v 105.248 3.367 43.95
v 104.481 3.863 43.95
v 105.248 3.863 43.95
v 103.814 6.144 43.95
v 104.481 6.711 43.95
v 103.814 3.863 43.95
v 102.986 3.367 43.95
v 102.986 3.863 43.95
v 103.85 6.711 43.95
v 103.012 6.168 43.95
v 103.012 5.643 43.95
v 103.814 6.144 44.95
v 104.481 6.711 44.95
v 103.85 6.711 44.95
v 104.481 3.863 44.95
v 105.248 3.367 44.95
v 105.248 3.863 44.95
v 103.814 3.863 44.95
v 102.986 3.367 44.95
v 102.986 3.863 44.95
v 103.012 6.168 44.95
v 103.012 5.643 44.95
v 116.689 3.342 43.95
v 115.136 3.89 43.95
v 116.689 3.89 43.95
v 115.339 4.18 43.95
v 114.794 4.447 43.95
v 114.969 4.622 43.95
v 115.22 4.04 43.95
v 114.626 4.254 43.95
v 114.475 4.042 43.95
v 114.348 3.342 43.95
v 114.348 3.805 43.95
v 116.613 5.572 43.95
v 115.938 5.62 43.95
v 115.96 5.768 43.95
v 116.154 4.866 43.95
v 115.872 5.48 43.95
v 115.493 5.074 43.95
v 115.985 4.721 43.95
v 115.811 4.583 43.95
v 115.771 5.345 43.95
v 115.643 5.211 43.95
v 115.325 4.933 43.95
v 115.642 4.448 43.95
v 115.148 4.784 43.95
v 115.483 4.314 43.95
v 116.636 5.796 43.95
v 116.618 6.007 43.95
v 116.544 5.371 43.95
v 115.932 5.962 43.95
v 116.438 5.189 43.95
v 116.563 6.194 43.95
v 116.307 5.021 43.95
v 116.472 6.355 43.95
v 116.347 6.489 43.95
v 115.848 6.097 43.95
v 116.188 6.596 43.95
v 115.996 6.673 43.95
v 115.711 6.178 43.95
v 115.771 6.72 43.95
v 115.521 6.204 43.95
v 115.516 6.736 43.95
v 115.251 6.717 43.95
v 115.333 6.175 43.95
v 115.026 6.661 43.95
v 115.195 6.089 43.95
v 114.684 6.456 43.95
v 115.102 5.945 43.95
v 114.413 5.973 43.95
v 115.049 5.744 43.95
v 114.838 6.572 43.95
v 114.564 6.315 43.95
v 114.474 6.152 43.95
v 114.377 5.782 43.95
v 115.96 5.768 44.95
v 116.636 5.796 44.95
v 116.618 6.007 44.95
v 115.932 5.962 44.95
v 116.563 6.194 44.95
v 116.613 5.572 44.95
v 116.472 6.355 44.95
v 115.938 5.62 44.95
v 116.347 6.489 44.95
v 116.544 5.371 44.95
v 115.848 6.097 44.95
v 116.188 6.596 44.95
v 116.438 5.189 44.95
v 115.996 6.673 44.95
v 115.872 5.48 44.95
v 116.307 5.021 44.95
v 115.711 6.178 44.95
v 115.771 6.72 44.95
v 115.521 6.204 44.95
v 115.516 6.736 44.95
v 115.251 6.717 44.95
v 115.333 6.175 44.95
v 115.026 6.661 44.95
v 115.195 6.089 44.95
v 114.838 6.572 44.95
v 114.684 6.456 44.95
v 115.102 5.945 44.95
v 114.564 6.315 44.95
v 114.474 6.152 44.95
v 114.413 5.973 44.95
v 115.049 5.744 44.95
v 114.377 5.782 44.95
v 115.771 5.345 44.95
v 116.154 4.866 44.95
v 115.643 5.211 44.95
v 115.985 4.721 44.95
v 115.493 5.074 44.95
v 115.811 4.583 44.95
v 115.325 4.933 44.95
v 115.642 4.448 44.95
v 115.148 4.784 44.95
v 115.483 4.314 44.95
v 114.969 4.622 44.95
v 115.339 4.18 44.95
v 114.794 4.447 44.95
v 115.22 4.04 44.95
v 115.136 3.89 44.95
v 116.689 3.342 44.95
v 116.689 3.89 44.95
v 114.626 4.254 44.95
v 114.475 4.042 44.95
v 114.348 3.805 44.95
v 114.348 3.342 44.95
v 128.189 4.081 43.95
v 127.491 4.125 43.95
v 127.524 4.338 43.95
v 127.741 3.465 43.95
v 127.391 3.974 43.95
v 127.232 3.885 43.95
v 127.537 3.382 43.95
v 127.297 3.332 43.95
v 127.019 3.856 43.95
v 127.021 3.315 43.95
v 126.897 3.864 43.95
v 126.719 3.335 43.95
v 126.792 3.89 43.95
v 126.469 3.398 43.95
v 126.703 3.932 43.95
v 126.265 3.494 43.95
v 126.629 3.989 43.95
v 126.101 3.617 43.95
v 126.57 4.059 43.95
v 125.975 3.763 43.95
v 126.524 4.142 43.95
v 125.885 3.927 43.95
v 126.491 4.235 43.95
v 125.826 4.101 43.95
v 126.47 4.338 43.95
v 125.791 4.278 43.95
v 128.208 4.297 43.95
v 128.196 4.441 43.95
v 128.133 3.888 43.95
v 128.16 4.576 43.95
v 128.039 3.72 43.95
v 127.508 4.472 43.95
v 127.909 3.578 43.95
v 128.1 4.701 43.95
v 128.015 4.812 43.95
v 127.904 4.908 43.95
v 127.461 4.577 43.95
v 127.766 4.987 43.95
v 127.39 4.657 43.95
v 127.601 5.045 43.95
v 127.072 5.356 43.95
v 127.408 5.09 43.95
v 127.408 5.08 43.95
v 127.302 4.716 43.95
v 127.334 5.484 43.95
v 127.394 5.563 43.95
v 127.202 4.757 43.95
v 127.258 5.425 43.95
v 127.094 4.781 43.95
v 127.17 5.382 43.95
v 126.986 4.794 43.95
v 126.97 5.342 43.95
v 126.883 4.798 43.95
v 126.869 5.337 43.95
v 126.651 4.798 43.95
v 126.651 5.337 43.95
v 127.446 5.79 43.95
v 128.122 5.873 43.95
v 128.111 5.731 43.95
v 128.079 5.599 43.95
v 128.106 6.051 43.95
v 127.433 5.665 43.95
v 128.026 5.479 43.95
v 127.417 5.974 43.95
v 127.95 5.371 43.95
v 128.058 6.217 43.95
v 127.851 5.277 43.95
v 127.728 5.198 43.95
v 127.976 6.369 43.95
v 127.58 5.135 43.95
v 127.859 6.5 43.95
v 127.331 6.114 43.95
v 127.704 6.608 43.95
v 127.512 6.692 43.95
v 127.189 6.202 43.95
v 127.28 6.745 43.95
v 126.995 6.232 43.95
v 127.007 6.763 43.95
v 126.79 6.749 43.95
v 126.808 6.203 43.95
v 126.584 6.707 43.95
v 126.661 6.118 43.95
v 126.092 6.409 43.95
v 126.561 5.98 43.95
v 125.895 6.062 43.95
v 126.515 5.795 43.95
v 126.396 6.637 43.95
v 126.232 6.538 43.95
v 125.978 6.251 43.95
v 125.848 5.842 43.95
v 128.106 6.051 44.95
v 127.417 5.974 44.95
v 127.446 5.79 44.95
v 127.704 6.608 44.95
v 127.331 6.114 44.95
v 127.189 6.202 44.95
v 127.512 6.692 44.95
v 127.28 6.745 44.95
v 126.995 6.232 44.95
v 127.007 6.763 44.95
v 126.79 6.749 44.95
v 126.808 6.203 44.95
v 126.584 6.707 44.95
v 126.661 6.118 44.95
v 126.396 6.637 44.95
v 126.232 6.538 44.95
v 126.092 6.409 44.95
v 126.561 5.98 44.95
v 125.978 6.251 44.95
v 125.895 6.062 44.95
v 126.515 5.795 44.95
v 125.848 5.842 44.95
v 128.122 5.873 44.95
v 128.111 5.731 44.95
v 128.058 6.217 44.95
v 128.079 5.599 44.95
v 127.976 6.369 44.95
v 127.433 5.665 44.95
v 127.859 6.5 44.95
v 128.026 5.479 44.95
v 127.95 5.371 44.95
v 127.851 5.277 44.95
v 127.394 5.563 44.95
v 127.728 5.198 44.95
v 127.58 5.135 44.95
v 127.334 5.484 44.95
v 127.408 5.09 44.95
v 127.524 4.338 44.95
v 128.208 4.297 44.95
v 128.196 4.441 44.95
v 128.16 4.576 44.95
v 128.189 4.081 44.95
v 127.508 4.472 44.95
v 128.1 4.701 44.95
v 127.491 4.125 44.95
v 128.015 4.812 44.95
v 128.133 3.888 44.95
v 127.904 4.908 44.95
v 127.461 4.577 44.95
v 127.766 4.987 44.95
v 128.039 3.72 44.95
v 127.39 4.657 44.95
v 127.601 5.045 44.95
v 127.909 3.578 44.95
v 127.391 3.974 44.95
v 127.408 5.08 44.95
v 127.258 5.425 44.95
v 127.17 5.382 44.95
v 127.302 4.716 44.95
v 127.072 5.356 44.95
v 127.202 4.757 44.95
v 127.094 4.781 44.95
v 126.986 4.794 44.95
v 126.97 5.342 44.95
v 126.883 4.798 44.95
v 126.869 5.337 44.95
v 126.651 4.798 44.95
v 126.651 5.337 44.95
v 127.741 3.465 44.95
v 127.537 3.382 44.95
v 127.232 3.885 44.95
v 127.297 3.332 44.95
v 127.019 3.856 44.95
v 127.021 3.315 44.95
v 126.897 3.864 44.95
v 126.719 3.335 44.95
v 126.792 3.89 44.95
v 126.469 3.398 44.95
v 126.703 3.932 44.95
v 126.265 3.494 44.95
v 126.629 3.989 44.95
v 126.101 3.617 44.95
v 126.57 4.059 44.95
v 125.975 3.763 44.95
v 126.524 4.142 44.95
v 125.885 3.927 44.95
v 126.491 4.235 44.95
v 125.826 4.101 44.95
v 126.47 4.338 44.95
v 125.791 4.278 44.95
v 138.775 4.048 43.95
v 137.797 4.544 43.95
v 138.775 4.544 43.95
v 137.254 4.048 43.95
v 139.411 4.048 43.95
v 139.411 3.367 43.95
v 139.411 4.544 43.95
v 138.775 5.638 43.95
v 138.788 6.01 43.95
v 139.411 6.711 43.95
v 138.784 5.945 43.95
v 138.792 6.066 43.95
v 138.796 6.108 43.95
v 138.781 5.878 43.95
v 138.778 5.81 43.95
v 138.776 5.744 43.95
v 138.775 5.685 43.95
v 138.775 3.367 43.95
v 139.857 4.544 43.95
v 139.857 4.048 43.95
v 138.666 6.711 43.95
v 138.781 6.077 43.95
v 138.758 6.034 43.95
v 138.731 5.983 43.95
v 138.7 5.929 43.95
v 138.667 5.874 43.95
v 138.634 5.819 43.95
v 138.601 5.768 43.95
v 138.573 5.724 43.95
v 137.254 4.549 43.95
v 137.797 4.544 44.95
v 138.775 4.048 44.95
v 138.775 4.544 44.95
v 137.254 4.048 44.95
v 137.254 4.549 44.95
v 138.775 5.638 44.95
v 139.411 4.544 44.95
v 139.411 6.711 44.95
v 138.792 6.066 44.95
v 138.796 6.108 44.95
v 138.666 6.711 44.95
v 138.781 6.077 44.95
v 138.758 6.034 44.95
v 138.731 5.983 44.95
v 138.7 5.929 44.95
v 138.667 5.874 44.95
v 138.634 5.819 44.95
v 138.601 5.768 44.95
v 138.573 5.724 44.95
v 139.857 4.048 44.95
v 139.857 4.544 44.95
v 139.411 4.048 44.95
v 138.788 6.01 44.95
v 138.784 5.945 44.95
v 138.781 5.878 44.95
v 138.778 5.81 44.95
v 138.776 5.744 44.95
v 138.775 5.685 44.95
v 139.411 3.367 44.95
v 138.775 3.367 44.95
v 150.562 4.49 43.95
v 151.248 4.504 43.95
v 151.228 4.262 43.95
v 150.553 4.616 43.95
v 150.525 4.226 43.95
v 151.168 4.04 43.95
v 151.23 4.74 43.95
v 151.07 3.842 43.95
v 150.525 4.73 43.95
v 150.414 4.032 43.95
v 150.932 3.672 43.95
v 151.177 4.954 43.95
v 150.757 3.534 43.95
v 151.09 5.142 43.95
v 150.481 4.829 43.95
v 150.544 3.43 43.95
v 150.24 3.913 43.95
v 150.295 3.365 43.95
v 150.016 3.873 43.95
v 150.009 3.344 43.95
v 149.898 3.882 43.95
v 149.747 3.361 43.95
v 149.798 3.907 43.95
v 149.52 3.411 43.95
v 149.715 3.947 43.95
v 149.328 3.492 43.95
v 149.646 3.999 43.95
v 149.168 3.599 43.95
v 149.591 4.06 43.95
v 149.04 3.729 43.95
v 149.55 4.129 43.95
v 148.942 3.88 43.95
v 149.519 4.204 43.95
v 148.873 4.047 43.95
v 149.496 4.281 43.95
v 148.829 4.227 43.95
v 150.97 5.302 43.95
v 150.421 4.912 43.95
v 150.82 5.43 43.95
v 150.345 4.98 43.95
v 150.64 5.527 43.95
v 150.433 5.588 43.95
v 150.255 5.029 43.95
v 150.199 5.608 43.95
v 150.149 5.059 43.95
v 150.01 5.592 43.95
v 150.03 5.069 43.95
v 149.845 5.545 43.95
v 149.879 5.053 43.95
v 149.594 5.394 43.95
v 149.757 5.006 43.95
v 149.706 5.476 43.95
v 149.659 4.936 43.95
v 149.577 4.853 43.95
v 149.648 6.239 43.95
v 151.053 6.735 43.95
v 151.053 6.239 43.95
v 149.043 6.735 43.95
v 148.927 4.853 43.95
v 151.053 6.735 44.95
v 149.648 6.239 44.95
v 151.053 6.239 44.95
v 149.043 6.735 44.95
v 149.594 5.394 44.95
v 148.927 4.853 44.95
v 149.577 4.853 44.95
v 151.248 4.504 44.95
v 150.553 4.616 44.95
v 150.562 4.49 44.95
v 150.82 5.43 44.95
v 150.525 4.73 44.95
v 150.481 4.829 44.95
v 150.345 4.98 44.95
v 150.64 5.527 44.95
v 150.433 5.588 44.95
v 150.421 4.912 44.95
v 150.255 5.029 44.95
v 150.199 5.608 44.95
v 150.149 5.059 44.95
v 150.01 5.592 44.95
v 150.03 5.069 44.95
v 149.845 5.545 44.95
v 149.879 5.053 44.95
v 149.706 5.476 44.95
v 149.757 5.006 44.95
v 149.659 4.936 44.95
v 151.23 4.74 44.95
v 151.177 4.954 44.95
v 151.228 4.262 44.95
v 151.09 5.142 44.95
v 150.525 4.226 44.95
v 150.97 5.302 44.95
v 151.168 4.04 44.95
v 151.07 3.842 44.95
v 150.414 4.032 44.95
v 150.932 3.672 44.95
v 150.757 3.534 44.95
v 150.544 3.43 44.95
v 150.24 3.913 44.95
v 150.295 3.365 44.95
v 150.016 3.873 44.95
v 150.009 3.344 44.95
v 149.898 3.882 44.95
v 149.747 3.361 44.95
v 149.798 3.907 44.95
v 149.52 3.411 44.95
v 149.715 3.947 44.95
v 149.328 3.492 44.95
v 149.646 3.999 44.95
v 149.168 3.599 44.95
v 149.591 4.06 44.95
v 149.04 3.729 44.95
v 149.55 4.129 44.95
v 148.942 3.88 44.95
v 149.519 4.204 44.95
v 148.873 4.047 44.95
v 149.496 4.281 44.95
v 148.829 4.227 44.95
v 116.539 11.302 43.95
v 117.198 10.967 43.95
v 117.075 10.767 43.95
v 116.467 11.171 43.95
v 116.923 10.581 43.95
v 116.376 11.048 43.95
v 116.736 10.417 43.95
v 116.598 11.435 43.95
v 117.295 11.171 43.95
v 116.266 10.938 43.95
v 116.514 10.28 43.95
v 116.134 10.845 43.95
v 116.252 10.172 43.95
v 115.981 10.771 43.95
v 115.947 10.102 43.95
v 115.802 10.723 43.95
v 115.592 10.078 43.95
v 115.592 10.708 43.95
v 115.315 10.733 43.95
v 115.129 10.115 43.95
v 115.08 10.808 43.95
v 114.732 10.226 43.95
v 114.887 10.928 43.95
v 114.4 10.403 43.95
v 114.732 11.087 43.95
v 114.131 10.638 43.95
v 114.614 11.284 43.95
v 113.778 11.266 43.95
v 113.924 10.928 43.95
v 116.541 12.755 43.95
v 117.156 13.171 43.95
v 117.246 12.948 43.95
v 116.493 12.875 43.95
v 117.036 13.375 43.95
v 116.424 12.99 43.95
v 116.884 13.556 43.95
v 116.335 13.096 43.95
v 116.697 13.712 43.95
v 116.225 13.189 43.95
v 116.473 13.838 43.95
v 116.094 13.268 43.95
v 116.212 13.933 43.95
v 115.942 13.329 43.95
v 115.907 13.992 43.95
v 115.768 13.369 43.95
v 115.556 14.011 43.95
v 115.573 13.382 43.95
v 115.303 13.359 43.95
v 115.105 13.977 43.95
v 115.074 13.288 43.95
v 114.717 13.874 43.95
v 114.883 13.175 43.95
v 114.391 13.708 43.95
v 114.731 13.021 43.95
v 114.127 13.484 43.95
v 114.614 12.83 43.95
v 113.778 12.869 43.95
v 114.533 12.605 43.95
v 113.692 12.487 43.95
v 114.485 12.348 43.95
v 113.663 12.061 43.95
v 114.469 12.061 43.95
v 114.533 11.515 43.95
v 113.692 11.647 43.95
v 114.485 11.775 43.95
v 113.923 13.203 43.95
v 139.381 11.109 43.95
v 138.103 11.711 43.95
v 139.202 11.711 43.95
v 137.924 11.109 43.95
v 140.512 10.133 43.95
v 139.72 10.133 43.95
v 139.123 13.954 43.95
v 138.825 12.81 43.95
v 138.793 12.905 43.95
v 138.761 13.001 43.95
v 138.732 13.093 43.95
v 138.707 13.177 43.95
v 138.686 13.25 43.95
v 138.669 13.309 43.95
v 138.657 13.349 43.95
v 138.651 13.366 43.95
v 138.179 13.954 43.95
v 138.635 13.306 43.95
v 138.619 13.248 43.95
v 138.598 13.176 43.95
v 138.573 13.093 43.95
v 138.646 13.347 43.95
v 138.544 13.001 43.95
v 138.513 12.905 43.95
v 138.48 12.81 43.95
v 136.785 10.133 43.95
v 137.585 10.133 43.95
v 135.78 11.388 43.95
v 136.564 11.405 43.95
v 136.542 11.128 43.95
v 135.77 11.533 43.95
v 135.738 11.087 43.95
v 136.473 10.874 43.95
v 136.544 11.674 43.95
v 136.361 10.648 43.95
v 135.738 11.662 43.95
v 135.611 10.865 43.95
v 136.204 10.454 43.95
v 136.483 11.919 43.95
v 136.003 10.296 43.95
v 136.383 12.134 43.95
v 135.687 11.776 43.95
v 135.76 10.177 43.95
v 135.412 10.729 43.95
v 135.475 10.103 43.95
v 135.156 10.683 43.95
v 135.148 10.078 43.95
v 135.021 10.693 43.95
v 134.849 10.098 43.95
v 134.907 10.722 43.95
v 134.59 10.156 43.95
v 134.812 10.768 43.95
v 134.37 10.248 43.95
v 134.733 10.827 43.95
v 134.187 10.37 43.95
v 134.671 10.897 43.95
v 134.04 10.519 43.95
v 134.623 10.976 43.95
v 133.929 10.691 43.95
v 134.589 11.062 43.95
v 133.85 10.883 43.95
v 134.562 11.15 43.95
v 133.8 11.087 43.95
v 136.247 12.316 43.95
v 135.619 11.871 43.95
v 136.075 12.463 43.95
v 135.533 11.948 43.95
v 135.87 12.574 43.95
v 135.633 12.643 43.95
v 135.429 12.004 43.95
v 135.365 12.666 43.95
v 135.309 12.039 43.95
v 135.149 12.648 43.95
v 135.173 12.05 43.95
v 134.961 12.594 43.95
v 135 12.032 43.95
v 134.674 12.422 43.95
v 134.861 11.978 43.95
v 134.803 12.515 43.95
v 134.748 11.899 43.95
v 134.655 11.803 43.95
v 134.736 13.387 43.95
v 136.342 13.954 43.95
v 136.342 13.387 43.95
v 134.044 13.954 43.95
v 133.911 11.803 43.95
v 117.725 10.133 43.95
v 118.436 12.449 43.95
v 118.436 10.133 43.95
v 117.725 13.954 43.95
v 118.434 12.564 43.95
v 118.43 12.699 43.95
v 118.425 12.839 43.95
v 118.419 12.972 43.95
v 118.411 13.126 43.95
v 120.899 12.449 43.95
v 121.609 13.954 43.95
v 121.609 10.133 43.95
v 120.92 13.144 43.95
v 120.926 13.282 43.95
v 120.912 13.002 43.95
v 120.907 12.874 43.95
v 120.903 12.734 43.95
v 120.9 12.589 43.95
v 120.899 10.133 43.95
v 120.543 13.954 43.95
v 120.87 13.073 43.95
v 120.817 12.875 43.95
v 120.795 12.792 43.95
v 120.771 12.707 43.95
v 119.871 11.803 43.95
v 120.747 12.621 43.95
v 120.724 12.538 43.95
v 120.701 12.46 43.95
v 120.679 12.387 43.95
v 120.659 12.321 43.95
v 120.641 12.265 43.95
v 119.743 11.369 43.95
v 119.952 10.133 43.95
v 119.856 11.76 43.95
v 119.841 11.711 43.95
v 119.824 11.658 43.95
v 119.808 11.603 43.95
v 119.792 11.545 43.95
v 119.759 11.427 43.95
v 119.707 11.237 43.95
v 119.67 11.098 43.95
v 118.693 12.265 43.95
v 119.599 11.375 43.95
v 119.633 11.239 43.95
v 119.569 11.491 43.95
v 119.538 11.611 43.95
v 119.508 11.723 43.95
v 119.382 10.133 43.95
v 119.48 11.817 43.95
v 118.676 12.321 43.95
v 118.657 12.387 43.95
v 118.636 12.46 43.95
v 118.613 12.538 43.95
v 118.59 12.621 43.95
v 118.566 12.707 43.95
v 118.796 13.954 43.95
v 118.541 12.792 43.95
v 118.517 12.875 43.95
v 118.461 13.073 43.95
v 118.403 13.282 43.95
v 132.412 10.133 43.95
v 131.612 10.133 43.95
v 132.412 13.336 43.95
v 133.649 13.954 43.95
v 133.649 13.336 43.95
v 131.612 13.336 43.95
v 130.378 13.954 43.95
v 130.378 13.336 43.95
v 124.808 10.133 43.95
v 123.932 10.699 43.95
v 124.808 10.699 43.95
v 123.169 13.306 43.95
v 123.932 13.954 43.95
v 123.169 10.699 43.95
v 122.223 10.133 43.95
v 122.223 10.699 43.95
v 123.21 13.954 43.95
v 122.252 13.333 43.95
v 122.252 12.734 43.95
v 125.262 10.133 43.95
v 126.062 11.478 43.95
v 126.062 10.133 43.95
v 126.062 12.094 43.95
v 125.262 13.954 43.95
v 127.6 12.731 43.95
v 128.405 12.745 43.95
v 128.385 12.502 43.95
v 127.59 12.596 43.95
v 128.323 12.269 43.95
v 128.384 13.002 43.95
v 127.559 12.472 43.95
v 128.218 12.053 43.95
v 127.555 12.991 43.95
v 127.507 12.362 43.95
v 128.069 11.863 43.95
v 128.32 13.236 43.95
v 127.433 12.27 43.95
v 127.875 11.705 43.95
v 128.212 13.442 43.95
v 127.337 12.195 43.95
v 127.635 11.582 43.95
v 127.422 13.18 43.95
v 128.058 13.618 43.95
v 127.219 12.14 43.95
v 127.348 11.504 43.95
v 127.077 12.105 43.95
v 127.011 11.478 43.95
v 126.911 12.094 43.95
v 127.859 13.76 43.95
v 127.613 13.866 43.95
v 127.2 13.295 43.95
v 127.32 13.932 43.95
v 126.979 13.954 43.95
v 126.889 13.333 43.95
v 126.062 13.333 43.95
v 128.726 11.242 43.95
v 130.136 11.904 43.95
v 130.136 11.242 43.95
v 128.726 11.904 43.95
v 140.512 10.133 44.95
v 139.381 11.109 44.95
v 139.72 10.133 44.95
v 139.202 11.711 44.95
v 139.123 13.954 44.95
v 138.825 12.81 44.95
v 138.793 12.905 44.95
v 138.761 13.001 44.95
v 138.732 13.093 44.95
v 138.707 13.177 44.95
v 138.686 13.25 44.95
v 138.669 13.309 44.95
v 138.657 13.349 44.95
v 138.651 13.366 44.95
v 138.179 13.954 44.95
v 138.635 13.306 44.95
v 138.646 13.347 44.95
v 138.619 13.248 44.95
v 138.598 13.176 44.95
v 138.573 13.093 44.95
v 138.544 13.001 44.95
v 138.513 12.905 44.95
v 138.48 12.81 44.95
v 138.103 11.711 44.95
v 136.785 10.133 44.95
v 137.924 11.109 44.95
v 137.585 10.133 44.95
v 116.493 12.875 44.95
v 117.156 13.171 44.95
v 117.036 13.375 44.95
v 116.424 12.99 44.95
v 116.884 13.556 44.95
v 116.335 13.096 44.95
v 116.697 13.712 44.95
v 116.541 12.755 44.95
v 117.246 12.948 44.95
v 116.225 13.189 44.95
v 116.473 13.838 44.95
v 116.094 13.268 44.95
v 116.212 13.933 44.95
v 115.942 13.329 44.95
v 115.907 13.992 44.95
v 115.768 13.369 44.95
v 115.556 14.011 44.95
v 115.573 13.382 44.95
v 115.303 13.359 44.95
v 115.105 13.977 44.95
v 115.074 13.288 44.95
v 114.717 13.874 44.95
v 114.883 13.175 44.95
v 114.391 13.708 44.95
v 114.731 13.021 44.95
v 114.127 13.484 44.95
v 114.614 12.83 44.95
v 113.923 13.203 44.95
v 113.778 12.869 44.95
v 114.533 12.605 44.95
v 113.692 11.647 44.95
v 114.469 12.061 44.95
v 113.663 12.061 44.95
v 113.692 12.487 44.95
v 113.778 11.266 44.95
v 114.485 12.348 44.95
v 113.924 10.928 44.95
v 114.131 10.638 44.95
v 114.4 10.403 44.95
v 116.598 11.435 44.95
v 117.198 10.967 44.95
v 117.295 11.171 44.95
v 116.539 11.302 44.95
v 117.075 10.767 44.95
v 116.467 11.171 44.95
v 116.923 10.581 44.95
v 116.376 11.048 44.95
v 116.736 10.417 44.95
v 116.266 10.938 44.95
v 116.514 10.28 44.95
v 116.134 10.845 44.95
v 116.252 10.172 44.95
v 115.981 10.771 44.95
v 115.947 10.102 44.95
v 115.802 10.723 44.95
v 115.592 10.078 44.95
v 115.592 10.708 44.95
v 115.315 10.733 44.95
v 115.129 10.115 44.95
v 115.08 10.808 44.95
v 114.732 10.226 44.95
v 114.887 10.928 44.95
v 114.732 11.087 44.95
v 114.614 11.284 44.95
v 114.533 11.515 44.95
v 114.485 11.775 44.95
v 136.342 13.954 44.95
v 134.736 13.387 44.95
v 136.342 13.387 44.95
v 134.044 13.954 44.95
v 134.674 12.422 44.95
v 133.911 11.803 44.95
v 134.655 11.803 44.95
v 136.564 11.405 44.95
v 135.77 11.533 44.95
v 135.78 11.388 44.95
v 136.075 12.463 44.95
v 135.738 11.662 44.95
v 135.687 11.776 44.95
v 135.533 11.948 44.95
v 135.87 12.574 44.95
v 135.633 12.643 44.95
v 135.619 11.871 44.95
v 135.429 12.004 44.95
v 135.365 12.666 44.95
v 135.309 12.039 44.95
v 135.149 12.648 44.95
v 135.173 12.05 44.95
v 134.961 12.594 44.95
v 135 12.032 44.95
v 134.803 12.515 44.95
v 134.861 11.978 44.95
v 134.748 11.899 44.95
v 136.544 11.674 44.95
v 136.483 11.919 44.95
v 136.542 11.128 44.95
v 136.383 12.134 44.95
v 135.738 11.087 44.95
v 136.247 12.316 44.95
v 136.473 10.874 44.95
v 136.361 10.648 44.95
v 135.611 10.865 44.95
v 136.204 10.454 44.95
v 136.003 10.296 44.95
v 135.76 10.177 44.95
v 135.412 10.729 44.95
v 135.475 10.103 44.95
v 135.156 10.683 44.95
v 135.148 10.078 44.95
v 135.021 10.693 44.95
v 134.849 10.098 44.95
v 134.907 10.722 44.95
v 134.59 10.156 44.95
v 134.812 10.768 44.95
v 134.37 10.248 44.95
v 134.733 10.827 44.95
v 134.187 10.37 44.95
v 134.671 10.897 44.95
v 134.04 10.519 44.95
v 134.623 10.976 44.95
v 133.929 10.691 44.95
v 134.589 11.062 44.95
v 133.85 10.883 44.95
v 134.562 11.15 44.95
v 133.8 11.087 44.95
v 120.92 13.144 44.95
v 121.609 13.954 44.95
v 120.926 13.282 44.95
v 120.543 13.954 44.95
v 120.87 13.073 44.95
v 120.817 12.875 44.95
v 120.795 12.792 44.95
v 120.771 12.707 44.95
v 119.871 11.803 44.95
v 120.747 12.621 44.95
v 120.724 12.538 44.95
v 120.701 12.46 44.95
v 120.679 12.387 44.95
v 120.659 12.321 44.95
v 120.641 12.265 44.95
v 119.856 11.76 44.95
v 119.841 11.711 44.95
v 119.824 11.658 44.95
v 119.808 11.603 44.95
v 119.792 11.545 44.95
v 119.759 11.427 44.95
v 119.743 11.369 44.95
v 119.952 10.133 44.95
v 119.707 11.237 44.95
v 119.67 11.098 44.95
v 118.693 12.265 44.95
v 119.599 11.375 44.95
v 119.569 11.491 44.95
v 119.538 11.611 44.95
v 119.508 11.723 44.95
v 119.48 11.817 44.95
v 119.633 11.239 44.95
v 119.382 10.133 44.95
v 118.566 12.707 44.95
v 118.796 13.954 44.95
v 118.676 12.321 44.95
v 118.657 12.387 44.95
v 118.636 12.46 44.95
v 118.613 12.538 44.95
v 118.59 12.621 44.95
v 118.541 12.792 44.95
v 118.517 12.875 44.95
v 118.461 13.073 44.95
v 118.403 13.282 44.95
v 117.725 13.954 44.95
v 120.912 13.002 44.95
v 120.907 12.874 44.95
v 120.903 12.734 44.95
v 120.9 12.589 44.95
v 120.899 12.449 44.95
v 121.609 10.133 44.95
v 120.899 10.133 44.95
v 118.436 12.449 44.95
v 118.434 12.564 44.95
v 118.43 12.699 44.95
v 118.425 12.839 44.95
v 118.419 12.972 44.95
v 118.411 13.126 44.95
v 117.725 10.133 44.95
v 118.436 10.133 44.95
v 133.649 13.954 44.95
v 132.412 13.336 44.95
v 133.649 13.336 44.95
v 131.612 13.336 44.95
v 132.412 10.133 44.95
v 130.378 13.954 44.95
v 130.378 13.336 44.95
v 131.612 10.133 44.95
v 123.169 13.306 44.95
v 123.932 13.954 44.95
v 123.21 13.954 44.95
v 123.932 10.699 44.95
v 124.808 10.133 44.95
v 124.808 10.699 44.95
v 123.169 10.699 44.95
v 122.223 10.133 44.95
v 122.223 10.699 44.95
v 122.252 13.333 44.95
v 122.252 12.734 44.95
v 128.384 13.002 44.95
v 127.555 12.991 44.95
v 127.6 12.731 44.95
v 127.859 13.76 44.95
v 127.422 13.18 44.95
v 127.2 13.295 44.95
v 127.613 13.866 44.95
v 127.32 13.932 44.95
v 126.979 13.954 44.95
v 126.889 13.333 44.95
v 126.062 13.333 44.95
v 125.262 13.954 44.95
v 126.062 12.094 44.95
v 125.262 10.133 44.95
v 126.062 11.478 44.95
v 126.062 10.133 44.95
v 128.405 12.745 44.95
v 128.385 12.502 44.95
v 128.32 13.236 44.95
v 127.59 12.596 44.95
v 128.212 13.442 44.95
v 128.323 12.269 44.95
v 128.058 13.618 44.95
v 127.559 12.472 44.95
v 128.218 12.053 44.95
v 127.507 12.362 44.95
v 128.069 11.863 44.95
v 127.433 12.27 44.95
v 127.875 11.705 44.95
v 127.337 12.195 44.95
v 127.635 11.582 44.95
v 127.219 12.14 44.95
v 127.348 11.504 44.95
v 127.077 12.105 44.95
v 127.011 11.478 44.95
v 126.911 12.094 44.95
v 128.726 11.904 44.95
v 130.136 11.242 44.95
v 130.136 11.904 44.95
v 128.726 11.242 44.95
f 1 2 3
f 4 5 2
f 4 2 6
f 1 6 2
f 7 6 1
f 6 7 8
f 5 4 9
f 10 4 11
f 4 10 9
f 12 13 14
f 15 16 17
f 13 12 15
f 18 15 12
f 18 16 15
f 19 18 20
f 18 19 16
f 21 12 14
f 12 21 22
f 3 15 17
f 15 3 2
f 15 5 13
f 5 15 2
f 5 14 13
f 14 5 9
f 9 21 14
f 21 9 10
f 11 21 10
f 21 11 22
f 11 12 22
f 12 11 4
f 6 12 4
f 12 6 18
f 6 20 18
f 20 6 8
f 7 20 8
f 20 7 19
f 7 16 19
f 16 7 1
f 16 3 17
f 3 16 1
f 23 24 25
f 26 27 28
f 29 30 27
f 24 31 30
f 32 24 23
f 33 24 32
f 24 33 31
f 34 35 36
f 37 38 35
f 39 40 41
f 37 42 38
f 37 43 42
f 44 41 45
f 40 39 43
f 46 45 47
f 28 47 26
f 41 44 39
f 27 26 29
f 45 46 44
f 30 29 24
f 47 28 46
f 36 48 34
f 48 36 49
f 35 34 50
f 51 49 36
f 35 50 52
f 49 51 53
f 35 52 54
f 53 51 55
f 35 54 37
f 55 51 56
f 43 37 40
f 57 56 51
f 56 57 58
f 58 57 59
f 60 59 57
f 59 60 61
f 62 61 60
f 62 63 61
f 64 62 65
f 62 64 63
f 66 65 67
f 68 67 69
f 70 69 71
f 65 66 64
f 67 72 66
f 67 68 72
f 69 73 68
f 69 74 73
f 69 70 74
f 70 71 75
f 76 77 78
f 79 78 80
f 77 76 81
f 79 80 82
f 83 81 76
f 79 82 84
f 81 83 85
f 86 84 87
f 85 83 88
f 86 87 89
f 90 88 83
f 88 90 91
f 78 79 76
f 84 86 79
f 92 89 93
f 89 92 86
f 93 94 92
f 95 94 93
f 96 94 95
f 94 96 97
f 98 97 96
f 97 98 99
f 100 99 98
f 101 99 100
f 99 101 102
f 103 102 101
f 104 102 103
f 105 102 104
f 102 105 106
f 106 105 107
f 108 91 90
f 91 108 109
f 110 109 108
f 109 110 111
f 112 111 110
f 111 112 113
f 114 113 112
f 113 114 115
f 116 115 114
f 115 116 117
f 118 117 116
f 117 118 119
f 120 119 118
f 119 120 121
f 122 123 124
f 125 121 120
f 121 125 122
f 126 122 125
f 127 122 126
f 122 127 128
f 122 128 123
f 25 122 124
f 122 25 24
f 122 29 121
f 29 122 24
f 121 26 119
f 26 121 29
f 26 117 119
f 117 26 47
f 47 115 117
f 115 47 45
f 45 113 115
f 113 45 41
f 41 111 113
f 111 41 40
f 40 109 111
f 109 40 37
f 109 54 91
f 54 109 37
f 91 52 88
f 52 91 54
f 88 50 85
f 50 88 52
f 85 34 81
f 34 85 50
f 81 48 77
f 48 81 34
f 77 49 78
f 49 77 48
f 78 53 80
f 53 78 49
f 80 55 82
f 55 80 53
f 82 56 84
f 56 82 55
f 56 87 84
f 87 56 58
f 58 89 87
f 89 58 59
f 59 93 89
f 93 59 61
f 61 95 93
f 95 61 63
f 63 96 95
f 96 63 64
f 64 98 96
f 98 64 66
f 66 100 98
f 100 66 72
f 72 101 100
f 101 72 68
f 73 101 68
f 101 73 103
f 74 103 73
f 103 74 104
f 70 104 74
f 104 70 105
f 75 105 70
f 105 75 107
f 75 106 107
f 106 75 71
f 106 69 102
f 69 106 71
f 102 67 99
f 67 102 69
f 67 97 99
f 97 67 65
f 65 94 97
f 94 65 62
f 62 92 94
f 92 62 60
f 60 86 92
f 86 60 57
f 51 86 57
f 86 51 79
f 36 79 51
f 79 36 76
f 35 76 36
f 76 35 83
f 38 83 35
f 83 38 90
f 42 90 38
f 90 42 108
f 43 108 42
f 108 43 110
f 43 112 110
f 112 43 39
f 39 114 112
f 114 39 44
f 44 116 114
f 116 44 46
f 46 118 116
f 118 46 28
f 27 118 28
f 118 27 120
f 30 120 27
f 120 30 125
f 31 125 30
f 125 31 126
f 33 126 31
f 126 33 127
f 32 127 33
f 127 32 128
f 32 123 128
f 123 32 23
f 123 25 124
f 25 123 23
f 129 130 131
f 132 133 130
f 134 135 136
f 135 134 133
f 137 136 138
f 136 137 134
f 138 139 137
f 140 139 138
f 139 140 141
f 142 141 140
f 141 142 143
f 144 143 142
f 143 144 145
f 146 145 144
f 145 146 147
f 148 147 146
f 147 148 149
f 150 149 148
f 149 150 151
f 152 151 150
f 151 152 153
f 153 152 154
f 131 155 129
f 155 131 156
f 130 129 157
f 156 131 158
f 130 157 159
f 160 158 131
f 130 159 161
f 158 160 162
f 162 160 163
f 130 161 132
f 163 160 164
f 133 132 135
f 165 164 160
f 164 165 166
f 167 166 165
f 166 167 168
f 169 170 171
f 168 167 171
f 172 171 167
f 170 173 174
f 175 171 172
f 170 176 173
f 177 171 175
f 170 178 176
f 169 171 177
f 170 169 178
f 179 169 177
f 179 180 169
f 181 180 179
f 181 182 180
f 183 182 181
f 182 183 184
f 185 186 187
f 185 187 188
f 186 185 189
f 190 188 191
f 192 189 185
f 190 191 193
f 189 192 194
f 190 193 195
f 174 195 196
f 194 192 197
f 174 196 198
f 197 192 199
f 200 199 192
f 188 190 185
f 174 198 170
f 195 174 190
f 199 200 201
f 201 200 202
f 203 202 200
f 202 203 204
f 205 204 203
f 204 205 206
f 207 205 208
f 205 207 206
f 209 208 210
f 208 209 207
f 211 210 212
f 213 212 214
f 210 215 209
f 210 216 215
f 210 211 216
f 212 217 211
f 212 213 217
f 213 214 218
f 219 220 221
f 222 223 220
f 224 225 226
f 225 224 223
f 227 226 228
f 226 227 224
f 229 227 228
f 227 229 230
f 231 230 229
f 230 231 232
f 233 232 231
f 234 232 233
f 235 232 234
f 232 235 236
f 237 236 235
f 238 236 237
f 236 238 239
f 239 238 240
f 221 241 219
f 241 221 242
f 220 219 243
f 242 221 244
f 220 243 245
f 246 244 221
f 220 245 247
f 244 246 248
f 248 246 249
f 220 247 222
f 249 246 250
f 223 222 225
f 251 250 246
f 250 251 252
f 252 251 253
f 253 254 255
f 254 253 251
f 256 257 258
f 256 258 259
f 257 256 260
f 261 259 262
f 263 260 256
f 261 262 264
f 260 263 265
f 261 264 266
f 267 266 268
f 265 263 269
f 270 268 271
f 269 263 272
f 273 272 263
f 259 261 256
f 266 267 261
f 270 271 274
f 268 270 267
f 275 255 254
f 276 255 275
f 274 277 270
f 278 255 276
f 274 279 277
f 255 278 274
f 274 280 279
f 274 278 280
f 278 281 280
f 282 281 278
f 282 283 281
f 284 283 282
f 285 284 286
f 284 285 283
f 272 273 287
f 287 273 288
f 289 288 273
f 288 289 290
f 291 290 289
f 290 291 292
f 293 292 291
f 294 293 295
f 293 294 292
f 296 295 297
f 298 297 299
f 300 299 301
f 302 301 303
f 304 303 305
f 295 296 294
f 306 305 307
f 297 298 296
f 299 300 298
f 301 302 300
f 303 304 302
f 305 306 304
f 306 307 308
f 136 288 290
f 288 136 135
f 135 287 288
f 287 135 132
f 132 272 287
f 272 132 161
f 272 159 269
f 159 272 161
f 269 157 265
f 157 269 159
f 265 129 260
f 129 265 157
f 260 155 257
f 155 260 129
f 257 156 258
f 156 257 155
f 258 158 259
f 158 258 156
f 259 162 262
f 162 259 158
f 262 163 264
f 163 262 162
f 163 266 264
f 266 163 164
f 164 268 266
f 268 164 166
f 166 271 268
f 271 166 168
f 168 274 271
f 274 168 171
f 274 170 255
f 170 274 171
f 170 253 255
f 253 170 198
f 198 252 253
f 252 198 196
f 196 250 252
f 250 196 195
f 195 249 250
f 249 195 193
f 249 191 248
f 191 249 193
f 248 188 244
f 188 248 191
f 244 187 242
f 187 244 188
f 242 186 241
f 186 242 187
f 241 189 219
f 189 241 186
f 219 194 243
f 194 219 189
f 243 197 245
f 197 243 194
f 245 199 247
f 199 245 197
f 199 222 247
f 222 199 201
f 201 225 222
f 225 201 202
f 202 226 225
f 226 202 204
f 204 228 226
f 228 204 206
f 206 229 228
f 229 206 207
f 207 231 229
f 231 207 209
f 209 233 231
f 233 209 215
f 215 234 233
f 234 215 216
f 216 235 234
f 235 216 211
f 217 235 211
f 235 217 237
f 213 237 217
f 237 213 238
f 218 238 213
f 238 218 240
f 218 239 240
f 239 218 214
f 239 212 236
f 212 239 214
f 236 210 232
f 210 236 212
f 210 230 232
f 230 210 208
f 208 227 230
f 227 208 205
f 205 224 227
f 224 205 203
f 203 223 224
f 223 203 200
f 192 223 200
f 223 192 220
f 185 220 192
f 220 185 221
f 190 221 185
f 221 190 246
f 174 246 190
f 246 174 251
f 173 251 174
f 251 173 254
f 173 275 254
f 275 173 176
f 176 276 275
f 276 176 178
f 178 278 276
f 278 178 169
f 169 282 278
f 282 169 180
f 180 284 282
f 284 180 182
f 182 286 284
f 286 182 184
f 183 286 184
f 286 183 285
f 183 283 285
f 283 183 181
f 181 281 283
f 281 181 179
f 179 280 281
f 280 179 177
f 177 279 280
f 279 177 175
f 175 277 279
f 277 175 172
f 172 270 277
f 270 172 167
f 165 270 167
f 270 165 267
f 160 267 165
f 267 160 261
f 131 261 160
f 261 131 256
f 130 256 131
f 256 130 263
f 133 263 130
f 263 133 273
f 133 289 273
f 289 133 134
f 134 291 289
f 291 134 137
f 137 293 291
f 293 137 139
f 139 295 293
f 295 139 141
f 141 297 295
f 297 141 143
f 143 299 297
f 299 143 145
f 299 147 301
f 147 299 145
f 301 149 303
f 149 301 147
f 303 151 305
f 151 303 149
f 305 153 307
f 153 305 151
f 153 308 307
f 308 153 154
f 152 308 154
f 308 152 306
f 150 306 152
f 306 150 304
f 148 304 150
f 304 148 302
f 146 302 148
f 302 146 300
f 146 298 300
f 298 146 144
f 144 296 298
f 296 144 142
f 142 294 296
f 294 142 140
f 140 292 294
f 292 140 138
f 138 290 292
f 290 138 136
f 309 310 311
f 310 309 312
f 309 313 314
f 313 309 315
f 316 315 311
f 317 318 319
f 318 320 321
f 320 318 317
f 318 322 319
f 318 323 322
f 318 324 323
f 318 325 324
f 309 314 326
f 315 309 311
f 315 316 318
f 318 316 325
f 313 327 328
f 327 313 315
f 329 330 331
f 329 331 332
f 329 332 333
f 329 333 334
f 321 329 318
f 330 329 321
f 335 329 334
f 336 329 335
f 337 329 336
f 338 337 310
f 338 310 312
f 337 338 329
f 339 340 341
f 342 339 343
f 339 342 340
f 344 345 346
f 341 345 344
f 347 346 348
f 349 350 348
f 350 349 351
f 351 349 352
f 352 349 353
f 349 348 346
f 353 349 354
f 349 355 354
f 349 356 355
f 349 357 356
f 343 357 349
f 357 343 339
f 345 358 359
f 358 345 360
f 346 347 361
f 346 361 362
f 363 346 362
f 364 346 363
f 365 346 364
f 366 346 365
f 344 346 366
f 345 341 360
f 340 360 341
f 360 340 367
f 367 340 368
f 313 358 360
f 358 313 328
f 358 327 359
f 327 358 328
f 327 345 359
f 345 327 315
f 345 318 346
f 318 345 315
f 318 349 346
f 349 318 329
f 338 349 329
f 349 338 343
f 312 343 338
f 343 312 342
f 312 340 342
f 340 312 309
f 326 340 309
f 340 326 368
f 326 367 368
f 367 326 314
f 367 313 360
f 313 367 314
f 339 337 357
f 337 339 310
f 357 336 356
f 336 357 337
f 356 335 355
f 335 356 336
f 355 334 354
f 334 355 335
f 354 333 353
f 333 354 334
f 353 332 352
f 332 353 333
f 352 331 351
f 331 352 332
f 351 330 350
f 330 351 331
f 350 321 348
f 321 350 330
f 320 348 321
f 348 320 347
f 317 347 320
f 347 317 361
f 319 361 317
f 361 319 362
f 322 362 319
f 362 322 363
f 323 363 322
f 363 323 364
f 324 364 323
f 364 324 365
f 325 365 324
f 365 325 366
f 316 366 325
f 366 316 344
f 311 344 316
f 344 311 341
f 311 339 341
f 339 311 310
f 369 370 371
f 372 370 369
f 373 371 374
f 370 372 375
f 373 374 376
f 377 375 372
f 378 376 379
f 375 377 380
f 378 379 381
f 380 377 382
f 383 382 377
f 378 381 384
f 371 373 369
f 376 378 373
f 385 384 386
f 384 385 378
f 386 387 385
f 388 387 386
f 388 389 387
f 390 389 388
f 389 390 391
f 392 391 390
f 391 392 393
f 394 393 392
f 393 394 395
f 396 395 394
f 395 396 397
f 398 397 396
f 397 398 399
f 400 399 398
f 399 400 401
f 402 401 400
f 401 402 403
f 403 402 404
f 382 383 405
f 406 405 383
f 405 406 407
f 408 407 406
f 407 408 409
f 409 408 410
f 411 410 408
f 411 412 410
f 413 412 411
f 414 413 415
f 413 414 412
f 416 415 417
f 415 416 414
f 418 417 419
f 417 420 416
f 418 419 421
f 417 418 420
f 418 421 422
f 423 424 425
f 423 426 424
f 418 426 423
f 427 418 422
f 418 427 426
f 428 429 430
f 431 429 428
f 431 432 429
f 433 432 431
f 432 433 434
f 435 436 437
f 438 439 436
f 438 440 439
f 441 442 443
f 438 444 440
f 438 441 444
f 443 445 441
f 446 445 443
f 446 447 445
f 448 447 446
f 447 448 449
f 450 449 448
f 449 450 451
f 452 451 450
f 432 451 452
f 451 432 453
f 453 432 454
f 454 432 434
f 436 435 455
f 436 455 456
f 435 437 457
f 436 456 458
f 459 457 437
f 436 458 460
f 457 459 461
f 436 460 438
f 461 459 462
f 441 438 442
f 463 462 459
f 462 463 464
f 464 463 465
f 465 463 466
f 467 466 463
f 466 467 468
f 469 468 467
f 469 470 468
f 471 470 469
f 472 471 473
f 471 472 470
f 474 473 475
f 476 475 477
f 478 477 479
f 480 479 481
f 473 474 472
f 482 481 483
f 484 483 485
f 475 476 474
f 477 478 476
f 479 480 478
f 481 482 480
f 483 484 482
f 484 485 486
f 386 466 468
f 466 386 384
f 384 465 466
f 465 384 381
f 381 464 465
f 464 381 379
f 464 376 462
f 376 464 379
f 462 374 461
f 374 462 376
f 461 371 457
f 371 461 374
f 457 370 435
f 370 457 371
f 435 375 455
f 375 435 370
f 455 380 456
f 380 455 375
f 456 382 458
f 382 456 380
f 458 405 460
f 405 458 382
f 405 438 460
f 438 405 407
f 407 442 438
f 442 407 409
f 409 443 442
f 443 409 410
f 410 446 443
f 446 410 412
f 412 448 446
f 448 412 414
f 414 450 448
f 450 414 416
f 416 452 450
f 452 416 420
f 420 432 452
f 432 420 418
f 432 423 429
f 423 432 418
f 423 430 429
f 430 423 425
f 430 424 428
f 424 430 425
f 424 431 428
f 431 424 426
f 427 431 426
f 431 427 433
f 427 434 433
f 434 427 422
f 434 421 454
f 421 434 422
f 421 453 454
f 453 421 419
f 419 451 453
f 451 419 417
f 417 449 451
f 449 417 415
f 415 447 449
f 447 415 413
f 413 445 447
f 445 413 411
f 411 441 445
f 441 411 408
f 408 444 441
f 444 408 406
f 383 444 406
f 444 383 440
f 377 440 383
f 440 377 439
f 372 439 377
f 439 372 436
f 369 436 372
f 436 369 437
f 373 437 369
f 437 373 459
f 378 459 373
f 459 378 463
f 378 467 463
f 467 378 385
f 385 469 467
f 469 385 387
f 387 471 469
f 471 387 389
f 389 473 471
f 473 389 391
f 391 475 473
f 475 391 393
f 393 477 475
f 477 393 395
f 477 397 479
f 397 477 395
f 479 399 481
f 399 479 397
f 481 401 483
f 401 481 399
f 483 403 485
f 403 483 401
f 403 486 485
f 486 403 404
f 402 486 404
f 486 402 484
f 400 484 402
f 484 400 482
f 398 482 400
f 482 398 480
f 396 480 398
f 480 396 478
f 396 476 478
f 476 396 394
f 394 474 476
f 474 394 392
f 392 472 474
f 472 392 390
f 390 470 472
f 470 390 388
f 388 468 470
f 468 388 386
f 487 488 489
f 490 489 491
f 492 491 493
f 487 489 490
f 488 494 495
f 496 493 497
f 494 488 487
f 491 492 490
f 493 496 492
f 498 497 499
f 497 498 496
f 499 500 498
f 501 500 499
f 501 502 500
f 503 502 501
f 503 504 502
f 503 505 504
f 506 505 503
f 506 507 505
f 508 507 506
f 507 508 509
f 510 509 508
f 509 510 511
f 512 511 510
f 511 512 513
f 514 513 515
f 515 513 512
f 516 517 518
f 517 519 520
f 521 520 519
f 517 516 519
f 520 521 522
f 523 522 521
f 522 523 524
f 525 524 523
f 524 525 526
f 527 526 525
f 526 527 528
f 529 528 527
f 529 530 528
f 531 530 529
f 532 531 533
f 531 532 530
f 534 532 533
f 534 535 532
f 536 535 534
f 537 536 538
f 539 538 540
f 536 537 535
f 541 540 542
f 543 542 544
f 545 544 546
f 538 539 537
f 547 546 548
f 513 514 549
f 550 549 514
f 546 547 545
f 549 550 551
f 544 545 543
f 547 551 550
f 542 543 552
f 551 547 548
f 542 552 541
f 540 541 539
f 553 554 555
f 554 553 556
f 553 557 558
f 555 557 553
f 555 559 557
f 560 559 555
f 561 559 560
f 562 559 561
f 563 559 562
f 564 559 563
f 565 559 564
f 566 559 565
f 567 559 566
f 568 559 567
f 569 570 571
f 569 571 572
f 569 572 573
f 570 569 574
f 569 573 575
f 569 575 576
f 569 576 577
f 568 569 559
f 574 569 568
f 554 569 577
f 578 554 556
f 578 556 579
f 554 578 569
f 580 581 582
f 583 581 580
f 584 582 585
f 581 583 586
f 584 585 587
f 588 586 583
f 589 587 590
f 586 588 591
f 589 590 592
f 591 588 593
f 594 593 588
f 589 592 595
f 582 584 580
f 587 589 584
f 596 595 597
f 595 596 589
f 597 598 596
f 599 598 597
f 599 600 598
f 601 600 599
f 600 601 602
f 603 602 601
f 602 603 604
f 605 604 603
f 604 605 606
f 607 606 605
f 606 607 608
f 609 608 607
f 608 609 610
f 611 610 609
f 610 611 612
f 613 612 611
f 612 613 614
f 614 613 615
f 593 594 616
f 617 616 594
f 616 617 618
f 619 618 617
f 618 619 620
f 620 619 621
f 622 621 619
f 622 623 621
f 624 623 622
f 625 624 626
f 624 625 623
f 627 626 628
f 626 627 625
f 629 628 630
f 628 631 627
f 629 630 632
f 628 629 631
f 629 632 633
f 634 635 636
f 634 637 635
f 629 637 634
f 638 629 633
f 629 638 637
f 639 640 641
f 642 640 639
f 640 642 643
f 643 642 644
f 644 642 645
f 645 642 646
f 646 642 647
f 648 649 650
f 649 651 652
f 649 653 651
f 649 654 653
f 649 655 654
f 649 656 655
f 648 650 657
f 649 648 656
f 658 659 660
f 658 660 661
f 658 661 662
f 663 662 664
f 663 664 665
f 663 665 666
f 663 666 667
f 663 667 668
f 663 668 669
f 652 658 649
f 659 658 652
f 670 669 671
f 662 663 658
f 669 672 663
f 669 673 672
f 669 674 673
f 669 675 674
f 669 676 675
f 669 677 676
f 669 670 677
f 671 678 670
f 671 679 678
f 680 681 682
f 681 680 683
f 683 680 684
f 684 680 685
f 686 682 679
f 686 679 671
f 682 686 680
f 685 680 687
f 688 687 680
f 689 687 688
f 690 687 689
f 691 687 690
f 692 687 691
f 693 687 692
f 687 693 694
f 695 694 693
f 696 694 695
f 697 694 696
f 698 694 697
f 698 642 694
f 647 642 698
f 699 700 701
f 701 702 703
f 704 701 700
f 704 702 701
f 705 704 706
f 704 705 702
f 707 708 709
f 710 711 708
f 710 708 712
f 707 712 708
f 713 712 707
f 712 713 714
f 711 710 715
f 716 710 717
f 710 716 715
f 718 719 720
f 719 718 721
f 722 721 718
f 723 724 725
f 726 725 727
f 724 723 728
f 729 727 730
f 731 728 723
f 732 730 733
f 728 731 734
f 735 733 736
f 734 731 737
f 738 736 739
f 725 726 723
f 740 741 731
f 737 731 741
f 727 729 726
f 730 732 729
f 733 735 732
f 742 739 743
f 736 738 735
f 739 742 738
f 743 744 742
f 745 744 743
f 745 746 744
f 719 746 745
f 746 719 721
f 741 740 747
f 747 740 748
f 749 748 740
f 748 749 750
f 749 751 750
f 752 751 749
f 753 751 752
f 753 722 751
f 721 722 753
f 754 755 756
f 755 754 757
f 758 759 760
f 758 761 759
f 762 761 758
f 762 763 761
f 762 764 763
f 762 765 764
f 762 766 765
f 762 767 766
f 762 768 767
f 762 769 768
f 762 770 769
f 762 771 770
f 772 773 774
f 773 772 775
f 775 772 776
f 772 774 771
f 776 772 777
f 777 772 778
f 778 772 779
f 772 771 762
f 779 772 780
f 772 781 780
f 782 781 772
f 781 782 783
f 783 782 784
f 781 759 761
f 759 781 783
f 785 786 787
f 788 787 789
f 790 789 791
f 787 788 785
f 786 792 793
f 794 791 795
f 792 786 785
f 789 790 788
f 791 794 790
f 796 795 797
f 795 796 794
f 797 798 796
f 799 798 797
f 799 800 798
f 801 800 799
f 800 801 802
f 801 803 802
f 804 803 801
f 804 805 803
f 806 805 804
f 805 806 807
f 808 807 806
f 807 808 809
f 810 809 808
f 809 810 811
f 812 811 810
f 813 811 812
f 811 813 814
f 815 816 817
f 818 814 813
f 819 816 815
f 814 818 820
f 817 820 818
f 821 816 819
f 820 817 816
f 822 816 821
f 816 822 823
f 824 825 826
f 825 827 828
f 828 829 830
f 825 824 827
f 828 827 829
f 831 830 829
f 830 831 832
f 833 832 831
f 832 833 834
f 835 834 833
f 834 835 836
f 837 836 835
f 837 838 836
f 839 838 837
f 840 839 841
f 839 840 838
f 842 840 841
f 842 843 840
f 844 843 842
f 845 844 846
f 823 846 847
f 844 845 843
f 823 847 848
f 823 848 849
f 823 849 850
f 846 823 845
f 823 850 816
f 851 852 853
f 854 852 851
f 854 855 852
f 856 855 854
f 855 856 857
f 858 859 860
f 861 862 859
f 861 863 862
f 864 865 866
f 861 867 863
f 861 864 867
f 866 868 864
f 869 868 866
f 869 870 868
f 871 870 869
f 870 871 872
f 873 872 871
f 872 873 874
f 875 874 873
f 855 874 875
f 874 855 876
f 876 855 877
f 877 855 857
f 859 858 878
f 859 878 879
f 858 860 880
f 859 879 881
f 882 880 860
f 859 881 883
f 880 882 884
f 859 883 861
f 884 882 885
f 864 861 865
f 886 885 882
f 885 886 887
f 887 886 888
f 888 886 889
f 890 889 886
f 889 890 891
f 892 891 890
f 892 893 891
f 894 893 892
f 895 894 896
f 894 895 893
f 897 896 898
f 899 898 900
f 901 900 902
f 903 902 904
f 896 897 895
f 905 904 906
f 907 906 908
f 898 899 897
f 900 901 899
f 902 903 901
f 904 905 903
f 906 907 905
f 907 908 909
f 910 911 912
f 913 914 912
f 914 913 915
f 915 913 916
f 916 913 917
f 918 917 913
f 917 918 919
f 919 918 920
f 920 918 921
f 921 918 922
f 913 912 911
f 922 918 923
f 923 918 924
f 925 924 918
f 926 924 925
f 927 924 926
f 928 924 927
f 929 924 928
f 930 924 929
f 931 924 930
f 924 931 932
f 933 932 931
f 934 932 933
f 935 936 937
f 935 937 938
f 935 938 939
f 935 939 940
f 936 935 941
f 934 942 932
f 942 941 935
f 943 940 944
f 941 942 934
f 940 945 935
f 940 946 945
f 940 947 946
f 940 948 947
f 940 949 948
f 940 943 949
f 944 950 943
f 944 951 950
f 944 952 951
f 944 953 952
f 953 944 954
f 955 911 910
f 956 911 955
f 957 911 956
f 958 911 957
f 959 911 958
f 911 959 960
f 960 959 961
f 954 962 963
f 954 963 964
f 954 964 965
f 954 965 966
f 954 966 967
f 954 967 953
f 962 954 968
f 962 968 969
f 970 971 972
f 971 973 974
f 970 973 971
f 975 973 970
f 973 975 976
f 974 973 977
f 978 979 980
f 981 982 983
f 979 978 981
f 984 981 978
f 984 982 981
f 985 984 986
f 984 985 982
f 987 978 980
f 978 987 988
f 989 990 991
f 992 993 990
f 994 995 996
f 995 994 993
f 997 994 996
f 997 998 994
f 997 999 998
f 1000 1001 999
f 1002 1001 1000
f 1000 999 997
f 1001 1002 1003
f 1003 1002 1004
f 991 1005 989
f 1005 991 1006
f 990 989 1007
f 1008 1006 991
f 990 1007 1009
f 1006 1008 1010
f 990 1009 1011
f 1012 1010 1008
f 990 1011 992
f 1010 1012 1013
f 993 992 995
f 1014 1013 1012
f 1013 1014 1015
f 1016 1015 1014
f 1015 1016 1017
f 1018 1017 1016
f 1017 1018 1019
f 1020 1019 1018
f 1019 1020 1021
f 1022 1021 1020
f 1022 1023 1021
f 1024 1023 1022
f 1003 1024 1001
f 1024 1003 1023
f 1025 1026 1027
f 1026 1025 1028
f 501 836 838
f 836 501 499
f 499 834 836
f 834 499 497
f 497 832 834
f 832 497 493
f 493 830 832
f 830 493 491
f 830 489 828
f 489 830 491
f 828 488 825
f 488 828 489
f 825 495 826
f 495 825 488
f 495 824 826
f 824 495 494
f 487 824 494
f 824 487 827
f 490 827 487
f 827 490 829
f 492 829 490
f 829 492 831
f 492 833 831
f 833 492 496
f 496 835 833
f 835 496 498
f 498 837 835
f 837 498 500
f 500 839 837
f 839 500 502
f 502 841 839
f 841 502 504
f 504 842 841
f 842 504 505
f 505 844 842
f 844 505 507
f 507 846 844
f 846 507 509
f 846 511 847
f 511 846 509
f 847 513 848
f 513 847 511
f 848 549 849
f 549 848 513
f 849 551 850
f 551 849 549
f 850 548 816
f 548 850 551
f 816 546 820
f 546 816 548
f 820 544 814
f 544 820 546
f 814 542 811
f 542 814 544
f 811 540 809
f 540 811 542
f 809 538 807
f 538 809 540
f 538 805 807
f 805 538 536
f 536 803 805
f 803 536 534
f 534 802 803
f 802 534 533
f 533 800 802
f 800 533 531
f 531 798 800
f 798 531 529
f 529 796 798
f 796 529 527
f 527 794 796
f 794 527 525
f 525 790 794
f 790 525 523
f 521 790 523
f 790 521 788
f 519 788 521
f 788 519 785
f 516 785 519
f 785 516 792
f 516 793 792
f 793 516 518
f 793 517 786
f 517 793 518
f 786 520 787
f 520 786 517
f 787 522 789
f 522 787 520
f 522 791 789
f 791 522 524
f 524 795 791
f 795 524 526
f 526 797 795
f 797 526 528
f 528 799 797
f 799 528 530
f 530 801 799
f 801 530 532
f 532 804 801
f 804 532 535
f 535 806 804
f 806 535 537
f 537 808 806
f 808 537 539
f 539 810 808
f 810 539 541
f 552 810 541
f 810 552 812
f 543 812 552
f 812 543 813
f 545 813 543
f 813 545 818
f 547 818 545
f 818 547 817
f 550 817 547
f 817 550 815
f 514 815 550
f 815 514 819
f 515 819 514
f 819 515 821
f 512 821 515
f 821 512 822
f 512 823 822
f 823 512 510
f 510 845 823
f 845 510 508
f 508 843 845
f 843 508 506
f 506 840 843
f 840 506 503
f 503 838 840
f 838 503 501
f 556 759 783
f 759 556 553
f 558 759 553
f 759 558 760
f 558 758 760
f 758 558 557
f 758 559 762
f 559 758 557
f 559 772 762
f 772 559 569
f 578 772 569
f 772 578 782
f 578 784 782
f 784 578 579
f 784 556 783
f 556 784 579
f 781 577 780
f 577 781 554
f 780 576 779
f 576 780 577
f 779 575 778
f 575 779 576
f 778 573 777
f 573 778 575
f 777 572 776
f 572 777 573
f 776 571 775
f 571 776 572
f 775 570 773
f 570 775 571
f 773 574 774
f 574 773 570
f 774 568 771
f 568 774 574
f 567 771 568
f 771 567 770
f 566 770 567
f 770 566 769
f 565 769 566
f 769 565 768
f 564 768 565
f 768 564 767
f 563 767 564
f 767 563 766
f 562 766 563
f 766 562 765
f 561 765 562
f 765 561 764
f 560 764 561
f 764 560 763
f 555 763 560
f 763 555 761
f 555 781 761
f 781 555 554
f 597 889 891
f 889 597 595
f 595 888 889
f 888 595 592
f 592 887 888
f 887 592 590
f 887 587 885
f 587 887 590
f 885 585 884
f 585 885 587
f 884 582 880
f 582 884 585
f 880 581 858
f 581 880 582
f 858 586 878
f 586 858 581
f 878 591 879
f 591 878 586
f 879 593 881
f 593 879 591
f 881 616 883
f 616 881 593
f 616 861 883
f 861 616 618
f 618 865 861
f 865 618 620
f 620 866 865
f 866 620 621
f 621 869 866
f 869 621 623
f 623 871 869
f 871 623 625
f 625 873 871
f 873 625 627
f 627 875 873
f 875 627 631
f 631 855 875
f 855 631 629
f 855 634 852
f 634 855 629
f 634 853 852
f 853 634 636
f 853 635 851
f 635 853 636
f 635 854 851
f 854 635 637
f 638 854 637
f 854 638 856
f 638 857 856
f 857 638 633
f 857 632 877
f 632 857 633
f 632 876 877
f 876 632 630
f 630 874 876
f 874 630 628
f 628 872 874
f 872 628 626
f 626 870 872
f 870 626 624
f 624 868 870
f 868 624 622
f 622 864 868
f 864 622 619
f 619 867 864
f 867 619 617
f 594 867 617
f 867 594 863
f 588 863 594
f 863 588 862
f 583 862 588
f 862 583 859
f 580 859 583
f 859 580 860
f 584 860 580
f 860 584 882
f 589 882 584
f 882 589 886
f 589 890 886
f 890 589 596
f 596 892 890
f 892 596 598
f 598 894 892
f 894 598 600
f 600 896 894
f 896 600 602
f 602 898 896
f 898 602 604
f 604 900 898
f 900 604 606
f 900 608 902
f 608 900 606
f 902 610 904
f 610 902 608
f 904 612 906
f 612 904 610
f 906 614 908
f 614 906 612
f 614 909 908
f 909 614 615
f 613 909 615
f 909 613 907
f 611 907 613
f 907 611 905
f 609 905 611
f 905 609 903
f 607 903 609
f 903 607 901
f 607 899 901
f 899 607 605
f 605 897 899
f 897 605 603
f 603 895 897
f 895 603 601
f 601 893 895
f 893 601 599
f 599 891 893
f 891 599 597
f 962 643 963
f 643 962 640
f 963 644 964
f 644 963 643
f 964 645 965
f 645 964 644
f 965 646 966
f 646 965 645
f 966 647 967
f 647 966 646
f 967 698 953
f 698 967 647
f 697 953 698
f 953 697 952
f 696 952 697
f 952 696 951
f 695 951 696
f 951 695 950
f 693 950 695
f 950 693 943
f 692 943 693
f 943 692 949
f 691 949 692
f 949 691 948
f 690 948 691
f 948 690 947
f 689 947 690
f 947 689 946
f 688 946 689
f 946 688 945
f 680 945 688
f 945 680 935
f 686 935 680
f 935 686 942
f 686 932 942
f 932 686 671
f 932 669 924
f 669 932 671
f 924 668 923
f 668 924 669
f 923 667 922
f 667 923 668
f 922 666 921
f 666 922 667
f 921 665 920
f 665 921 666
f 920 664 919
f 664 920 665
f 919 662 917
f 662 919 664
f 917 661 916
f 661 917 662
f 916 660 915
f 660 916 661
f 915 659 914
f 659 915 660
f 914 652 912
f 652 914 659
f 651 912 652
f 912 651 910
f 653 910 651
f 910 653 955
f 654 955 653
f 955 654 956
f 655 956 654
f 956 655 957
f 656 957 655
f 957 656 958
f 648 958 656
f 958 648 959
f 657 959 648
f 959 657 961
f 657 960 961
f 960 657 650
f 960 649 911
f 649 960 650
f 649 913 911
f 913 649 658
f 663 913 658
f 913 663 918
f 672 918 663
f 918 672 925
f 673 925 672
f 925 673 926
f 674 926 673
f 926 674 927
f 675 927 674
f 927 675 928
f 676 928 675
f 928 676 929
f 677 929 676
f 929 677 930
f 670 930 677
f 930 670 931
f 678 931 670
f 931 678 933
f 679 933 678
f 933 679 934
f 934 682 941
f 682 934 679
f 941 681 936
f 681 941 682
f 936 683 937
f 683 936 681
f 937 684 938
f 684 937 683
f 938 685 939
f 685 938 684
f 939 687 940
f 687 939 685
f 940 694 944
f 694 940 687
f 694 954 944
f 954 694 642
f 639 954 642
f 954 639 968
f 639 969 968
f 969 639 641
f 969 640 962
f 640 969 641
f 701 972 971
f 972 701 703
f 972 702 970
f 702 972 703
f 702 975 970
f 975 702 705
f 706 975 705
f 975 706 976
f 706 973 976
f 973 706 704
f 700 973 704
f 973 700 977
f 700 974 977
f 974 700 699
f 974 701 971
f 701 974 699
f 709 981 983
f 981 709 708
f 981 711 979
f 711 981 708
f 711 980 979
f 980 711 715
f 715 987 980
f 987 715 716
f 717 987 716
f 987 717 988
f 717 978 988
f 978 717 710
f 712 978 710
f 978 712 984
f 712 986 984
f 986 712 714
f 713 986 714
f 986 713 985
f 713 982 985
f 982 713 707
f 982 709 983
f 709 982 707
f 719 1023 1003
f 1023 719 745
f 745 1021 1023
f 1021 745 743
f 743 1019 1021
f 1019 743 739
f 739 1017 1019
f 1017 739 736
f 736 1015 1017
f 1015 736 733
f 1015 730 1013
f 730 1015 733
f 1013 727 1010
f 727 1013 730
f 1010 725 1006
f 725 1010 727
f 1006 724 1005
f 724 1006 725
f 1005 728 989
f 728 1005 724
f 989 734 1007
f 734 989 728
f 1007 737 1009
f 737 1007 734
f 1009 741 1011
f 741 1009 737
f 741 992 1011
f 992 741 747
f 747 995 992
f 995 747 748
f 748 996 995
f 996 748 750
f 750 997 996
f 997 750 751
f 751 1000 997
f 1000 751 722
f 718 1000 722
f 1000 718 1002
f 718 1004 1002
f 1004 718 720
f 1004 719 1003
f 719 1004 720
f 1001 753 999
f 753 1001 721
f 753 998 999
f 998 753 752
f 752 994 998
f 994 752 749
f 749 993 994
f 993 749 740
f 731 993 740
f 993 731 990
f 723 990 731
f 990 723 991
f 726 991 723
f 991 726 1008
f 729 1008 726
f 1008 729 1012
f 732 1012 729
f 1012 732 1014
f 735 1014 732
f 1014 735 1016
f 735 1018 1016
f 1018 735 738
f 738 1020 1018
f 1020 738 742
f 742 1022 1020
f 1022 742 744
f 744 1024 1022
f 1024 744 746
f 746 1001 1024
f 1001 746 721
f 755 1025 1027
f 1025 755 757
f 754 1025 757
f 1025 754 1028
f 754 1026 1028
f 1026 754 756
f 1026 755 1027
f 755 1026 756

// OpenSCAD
// CM1P-T5 ID text and hole numbers, engraved 0.5 into the plate's top face (frame as cm1p_t5_freecad.py). -D 'tag="A"'
tag = "A";
translate([127, 12, 43.95]) linear_extrude(1) text(str("CM1P-T5", tag), size = 4, font = "Liberation Sans:style=Bold", halign = "center", valign = "center");
for (i = [0 : 4]) translate([104 + i * 11.5, 5, 43.95]) linear_extrude(1) text(str(i + 1), size = 3.5, font = "Liberation Sans:style=Bold", halign = "center", valign = "center");
